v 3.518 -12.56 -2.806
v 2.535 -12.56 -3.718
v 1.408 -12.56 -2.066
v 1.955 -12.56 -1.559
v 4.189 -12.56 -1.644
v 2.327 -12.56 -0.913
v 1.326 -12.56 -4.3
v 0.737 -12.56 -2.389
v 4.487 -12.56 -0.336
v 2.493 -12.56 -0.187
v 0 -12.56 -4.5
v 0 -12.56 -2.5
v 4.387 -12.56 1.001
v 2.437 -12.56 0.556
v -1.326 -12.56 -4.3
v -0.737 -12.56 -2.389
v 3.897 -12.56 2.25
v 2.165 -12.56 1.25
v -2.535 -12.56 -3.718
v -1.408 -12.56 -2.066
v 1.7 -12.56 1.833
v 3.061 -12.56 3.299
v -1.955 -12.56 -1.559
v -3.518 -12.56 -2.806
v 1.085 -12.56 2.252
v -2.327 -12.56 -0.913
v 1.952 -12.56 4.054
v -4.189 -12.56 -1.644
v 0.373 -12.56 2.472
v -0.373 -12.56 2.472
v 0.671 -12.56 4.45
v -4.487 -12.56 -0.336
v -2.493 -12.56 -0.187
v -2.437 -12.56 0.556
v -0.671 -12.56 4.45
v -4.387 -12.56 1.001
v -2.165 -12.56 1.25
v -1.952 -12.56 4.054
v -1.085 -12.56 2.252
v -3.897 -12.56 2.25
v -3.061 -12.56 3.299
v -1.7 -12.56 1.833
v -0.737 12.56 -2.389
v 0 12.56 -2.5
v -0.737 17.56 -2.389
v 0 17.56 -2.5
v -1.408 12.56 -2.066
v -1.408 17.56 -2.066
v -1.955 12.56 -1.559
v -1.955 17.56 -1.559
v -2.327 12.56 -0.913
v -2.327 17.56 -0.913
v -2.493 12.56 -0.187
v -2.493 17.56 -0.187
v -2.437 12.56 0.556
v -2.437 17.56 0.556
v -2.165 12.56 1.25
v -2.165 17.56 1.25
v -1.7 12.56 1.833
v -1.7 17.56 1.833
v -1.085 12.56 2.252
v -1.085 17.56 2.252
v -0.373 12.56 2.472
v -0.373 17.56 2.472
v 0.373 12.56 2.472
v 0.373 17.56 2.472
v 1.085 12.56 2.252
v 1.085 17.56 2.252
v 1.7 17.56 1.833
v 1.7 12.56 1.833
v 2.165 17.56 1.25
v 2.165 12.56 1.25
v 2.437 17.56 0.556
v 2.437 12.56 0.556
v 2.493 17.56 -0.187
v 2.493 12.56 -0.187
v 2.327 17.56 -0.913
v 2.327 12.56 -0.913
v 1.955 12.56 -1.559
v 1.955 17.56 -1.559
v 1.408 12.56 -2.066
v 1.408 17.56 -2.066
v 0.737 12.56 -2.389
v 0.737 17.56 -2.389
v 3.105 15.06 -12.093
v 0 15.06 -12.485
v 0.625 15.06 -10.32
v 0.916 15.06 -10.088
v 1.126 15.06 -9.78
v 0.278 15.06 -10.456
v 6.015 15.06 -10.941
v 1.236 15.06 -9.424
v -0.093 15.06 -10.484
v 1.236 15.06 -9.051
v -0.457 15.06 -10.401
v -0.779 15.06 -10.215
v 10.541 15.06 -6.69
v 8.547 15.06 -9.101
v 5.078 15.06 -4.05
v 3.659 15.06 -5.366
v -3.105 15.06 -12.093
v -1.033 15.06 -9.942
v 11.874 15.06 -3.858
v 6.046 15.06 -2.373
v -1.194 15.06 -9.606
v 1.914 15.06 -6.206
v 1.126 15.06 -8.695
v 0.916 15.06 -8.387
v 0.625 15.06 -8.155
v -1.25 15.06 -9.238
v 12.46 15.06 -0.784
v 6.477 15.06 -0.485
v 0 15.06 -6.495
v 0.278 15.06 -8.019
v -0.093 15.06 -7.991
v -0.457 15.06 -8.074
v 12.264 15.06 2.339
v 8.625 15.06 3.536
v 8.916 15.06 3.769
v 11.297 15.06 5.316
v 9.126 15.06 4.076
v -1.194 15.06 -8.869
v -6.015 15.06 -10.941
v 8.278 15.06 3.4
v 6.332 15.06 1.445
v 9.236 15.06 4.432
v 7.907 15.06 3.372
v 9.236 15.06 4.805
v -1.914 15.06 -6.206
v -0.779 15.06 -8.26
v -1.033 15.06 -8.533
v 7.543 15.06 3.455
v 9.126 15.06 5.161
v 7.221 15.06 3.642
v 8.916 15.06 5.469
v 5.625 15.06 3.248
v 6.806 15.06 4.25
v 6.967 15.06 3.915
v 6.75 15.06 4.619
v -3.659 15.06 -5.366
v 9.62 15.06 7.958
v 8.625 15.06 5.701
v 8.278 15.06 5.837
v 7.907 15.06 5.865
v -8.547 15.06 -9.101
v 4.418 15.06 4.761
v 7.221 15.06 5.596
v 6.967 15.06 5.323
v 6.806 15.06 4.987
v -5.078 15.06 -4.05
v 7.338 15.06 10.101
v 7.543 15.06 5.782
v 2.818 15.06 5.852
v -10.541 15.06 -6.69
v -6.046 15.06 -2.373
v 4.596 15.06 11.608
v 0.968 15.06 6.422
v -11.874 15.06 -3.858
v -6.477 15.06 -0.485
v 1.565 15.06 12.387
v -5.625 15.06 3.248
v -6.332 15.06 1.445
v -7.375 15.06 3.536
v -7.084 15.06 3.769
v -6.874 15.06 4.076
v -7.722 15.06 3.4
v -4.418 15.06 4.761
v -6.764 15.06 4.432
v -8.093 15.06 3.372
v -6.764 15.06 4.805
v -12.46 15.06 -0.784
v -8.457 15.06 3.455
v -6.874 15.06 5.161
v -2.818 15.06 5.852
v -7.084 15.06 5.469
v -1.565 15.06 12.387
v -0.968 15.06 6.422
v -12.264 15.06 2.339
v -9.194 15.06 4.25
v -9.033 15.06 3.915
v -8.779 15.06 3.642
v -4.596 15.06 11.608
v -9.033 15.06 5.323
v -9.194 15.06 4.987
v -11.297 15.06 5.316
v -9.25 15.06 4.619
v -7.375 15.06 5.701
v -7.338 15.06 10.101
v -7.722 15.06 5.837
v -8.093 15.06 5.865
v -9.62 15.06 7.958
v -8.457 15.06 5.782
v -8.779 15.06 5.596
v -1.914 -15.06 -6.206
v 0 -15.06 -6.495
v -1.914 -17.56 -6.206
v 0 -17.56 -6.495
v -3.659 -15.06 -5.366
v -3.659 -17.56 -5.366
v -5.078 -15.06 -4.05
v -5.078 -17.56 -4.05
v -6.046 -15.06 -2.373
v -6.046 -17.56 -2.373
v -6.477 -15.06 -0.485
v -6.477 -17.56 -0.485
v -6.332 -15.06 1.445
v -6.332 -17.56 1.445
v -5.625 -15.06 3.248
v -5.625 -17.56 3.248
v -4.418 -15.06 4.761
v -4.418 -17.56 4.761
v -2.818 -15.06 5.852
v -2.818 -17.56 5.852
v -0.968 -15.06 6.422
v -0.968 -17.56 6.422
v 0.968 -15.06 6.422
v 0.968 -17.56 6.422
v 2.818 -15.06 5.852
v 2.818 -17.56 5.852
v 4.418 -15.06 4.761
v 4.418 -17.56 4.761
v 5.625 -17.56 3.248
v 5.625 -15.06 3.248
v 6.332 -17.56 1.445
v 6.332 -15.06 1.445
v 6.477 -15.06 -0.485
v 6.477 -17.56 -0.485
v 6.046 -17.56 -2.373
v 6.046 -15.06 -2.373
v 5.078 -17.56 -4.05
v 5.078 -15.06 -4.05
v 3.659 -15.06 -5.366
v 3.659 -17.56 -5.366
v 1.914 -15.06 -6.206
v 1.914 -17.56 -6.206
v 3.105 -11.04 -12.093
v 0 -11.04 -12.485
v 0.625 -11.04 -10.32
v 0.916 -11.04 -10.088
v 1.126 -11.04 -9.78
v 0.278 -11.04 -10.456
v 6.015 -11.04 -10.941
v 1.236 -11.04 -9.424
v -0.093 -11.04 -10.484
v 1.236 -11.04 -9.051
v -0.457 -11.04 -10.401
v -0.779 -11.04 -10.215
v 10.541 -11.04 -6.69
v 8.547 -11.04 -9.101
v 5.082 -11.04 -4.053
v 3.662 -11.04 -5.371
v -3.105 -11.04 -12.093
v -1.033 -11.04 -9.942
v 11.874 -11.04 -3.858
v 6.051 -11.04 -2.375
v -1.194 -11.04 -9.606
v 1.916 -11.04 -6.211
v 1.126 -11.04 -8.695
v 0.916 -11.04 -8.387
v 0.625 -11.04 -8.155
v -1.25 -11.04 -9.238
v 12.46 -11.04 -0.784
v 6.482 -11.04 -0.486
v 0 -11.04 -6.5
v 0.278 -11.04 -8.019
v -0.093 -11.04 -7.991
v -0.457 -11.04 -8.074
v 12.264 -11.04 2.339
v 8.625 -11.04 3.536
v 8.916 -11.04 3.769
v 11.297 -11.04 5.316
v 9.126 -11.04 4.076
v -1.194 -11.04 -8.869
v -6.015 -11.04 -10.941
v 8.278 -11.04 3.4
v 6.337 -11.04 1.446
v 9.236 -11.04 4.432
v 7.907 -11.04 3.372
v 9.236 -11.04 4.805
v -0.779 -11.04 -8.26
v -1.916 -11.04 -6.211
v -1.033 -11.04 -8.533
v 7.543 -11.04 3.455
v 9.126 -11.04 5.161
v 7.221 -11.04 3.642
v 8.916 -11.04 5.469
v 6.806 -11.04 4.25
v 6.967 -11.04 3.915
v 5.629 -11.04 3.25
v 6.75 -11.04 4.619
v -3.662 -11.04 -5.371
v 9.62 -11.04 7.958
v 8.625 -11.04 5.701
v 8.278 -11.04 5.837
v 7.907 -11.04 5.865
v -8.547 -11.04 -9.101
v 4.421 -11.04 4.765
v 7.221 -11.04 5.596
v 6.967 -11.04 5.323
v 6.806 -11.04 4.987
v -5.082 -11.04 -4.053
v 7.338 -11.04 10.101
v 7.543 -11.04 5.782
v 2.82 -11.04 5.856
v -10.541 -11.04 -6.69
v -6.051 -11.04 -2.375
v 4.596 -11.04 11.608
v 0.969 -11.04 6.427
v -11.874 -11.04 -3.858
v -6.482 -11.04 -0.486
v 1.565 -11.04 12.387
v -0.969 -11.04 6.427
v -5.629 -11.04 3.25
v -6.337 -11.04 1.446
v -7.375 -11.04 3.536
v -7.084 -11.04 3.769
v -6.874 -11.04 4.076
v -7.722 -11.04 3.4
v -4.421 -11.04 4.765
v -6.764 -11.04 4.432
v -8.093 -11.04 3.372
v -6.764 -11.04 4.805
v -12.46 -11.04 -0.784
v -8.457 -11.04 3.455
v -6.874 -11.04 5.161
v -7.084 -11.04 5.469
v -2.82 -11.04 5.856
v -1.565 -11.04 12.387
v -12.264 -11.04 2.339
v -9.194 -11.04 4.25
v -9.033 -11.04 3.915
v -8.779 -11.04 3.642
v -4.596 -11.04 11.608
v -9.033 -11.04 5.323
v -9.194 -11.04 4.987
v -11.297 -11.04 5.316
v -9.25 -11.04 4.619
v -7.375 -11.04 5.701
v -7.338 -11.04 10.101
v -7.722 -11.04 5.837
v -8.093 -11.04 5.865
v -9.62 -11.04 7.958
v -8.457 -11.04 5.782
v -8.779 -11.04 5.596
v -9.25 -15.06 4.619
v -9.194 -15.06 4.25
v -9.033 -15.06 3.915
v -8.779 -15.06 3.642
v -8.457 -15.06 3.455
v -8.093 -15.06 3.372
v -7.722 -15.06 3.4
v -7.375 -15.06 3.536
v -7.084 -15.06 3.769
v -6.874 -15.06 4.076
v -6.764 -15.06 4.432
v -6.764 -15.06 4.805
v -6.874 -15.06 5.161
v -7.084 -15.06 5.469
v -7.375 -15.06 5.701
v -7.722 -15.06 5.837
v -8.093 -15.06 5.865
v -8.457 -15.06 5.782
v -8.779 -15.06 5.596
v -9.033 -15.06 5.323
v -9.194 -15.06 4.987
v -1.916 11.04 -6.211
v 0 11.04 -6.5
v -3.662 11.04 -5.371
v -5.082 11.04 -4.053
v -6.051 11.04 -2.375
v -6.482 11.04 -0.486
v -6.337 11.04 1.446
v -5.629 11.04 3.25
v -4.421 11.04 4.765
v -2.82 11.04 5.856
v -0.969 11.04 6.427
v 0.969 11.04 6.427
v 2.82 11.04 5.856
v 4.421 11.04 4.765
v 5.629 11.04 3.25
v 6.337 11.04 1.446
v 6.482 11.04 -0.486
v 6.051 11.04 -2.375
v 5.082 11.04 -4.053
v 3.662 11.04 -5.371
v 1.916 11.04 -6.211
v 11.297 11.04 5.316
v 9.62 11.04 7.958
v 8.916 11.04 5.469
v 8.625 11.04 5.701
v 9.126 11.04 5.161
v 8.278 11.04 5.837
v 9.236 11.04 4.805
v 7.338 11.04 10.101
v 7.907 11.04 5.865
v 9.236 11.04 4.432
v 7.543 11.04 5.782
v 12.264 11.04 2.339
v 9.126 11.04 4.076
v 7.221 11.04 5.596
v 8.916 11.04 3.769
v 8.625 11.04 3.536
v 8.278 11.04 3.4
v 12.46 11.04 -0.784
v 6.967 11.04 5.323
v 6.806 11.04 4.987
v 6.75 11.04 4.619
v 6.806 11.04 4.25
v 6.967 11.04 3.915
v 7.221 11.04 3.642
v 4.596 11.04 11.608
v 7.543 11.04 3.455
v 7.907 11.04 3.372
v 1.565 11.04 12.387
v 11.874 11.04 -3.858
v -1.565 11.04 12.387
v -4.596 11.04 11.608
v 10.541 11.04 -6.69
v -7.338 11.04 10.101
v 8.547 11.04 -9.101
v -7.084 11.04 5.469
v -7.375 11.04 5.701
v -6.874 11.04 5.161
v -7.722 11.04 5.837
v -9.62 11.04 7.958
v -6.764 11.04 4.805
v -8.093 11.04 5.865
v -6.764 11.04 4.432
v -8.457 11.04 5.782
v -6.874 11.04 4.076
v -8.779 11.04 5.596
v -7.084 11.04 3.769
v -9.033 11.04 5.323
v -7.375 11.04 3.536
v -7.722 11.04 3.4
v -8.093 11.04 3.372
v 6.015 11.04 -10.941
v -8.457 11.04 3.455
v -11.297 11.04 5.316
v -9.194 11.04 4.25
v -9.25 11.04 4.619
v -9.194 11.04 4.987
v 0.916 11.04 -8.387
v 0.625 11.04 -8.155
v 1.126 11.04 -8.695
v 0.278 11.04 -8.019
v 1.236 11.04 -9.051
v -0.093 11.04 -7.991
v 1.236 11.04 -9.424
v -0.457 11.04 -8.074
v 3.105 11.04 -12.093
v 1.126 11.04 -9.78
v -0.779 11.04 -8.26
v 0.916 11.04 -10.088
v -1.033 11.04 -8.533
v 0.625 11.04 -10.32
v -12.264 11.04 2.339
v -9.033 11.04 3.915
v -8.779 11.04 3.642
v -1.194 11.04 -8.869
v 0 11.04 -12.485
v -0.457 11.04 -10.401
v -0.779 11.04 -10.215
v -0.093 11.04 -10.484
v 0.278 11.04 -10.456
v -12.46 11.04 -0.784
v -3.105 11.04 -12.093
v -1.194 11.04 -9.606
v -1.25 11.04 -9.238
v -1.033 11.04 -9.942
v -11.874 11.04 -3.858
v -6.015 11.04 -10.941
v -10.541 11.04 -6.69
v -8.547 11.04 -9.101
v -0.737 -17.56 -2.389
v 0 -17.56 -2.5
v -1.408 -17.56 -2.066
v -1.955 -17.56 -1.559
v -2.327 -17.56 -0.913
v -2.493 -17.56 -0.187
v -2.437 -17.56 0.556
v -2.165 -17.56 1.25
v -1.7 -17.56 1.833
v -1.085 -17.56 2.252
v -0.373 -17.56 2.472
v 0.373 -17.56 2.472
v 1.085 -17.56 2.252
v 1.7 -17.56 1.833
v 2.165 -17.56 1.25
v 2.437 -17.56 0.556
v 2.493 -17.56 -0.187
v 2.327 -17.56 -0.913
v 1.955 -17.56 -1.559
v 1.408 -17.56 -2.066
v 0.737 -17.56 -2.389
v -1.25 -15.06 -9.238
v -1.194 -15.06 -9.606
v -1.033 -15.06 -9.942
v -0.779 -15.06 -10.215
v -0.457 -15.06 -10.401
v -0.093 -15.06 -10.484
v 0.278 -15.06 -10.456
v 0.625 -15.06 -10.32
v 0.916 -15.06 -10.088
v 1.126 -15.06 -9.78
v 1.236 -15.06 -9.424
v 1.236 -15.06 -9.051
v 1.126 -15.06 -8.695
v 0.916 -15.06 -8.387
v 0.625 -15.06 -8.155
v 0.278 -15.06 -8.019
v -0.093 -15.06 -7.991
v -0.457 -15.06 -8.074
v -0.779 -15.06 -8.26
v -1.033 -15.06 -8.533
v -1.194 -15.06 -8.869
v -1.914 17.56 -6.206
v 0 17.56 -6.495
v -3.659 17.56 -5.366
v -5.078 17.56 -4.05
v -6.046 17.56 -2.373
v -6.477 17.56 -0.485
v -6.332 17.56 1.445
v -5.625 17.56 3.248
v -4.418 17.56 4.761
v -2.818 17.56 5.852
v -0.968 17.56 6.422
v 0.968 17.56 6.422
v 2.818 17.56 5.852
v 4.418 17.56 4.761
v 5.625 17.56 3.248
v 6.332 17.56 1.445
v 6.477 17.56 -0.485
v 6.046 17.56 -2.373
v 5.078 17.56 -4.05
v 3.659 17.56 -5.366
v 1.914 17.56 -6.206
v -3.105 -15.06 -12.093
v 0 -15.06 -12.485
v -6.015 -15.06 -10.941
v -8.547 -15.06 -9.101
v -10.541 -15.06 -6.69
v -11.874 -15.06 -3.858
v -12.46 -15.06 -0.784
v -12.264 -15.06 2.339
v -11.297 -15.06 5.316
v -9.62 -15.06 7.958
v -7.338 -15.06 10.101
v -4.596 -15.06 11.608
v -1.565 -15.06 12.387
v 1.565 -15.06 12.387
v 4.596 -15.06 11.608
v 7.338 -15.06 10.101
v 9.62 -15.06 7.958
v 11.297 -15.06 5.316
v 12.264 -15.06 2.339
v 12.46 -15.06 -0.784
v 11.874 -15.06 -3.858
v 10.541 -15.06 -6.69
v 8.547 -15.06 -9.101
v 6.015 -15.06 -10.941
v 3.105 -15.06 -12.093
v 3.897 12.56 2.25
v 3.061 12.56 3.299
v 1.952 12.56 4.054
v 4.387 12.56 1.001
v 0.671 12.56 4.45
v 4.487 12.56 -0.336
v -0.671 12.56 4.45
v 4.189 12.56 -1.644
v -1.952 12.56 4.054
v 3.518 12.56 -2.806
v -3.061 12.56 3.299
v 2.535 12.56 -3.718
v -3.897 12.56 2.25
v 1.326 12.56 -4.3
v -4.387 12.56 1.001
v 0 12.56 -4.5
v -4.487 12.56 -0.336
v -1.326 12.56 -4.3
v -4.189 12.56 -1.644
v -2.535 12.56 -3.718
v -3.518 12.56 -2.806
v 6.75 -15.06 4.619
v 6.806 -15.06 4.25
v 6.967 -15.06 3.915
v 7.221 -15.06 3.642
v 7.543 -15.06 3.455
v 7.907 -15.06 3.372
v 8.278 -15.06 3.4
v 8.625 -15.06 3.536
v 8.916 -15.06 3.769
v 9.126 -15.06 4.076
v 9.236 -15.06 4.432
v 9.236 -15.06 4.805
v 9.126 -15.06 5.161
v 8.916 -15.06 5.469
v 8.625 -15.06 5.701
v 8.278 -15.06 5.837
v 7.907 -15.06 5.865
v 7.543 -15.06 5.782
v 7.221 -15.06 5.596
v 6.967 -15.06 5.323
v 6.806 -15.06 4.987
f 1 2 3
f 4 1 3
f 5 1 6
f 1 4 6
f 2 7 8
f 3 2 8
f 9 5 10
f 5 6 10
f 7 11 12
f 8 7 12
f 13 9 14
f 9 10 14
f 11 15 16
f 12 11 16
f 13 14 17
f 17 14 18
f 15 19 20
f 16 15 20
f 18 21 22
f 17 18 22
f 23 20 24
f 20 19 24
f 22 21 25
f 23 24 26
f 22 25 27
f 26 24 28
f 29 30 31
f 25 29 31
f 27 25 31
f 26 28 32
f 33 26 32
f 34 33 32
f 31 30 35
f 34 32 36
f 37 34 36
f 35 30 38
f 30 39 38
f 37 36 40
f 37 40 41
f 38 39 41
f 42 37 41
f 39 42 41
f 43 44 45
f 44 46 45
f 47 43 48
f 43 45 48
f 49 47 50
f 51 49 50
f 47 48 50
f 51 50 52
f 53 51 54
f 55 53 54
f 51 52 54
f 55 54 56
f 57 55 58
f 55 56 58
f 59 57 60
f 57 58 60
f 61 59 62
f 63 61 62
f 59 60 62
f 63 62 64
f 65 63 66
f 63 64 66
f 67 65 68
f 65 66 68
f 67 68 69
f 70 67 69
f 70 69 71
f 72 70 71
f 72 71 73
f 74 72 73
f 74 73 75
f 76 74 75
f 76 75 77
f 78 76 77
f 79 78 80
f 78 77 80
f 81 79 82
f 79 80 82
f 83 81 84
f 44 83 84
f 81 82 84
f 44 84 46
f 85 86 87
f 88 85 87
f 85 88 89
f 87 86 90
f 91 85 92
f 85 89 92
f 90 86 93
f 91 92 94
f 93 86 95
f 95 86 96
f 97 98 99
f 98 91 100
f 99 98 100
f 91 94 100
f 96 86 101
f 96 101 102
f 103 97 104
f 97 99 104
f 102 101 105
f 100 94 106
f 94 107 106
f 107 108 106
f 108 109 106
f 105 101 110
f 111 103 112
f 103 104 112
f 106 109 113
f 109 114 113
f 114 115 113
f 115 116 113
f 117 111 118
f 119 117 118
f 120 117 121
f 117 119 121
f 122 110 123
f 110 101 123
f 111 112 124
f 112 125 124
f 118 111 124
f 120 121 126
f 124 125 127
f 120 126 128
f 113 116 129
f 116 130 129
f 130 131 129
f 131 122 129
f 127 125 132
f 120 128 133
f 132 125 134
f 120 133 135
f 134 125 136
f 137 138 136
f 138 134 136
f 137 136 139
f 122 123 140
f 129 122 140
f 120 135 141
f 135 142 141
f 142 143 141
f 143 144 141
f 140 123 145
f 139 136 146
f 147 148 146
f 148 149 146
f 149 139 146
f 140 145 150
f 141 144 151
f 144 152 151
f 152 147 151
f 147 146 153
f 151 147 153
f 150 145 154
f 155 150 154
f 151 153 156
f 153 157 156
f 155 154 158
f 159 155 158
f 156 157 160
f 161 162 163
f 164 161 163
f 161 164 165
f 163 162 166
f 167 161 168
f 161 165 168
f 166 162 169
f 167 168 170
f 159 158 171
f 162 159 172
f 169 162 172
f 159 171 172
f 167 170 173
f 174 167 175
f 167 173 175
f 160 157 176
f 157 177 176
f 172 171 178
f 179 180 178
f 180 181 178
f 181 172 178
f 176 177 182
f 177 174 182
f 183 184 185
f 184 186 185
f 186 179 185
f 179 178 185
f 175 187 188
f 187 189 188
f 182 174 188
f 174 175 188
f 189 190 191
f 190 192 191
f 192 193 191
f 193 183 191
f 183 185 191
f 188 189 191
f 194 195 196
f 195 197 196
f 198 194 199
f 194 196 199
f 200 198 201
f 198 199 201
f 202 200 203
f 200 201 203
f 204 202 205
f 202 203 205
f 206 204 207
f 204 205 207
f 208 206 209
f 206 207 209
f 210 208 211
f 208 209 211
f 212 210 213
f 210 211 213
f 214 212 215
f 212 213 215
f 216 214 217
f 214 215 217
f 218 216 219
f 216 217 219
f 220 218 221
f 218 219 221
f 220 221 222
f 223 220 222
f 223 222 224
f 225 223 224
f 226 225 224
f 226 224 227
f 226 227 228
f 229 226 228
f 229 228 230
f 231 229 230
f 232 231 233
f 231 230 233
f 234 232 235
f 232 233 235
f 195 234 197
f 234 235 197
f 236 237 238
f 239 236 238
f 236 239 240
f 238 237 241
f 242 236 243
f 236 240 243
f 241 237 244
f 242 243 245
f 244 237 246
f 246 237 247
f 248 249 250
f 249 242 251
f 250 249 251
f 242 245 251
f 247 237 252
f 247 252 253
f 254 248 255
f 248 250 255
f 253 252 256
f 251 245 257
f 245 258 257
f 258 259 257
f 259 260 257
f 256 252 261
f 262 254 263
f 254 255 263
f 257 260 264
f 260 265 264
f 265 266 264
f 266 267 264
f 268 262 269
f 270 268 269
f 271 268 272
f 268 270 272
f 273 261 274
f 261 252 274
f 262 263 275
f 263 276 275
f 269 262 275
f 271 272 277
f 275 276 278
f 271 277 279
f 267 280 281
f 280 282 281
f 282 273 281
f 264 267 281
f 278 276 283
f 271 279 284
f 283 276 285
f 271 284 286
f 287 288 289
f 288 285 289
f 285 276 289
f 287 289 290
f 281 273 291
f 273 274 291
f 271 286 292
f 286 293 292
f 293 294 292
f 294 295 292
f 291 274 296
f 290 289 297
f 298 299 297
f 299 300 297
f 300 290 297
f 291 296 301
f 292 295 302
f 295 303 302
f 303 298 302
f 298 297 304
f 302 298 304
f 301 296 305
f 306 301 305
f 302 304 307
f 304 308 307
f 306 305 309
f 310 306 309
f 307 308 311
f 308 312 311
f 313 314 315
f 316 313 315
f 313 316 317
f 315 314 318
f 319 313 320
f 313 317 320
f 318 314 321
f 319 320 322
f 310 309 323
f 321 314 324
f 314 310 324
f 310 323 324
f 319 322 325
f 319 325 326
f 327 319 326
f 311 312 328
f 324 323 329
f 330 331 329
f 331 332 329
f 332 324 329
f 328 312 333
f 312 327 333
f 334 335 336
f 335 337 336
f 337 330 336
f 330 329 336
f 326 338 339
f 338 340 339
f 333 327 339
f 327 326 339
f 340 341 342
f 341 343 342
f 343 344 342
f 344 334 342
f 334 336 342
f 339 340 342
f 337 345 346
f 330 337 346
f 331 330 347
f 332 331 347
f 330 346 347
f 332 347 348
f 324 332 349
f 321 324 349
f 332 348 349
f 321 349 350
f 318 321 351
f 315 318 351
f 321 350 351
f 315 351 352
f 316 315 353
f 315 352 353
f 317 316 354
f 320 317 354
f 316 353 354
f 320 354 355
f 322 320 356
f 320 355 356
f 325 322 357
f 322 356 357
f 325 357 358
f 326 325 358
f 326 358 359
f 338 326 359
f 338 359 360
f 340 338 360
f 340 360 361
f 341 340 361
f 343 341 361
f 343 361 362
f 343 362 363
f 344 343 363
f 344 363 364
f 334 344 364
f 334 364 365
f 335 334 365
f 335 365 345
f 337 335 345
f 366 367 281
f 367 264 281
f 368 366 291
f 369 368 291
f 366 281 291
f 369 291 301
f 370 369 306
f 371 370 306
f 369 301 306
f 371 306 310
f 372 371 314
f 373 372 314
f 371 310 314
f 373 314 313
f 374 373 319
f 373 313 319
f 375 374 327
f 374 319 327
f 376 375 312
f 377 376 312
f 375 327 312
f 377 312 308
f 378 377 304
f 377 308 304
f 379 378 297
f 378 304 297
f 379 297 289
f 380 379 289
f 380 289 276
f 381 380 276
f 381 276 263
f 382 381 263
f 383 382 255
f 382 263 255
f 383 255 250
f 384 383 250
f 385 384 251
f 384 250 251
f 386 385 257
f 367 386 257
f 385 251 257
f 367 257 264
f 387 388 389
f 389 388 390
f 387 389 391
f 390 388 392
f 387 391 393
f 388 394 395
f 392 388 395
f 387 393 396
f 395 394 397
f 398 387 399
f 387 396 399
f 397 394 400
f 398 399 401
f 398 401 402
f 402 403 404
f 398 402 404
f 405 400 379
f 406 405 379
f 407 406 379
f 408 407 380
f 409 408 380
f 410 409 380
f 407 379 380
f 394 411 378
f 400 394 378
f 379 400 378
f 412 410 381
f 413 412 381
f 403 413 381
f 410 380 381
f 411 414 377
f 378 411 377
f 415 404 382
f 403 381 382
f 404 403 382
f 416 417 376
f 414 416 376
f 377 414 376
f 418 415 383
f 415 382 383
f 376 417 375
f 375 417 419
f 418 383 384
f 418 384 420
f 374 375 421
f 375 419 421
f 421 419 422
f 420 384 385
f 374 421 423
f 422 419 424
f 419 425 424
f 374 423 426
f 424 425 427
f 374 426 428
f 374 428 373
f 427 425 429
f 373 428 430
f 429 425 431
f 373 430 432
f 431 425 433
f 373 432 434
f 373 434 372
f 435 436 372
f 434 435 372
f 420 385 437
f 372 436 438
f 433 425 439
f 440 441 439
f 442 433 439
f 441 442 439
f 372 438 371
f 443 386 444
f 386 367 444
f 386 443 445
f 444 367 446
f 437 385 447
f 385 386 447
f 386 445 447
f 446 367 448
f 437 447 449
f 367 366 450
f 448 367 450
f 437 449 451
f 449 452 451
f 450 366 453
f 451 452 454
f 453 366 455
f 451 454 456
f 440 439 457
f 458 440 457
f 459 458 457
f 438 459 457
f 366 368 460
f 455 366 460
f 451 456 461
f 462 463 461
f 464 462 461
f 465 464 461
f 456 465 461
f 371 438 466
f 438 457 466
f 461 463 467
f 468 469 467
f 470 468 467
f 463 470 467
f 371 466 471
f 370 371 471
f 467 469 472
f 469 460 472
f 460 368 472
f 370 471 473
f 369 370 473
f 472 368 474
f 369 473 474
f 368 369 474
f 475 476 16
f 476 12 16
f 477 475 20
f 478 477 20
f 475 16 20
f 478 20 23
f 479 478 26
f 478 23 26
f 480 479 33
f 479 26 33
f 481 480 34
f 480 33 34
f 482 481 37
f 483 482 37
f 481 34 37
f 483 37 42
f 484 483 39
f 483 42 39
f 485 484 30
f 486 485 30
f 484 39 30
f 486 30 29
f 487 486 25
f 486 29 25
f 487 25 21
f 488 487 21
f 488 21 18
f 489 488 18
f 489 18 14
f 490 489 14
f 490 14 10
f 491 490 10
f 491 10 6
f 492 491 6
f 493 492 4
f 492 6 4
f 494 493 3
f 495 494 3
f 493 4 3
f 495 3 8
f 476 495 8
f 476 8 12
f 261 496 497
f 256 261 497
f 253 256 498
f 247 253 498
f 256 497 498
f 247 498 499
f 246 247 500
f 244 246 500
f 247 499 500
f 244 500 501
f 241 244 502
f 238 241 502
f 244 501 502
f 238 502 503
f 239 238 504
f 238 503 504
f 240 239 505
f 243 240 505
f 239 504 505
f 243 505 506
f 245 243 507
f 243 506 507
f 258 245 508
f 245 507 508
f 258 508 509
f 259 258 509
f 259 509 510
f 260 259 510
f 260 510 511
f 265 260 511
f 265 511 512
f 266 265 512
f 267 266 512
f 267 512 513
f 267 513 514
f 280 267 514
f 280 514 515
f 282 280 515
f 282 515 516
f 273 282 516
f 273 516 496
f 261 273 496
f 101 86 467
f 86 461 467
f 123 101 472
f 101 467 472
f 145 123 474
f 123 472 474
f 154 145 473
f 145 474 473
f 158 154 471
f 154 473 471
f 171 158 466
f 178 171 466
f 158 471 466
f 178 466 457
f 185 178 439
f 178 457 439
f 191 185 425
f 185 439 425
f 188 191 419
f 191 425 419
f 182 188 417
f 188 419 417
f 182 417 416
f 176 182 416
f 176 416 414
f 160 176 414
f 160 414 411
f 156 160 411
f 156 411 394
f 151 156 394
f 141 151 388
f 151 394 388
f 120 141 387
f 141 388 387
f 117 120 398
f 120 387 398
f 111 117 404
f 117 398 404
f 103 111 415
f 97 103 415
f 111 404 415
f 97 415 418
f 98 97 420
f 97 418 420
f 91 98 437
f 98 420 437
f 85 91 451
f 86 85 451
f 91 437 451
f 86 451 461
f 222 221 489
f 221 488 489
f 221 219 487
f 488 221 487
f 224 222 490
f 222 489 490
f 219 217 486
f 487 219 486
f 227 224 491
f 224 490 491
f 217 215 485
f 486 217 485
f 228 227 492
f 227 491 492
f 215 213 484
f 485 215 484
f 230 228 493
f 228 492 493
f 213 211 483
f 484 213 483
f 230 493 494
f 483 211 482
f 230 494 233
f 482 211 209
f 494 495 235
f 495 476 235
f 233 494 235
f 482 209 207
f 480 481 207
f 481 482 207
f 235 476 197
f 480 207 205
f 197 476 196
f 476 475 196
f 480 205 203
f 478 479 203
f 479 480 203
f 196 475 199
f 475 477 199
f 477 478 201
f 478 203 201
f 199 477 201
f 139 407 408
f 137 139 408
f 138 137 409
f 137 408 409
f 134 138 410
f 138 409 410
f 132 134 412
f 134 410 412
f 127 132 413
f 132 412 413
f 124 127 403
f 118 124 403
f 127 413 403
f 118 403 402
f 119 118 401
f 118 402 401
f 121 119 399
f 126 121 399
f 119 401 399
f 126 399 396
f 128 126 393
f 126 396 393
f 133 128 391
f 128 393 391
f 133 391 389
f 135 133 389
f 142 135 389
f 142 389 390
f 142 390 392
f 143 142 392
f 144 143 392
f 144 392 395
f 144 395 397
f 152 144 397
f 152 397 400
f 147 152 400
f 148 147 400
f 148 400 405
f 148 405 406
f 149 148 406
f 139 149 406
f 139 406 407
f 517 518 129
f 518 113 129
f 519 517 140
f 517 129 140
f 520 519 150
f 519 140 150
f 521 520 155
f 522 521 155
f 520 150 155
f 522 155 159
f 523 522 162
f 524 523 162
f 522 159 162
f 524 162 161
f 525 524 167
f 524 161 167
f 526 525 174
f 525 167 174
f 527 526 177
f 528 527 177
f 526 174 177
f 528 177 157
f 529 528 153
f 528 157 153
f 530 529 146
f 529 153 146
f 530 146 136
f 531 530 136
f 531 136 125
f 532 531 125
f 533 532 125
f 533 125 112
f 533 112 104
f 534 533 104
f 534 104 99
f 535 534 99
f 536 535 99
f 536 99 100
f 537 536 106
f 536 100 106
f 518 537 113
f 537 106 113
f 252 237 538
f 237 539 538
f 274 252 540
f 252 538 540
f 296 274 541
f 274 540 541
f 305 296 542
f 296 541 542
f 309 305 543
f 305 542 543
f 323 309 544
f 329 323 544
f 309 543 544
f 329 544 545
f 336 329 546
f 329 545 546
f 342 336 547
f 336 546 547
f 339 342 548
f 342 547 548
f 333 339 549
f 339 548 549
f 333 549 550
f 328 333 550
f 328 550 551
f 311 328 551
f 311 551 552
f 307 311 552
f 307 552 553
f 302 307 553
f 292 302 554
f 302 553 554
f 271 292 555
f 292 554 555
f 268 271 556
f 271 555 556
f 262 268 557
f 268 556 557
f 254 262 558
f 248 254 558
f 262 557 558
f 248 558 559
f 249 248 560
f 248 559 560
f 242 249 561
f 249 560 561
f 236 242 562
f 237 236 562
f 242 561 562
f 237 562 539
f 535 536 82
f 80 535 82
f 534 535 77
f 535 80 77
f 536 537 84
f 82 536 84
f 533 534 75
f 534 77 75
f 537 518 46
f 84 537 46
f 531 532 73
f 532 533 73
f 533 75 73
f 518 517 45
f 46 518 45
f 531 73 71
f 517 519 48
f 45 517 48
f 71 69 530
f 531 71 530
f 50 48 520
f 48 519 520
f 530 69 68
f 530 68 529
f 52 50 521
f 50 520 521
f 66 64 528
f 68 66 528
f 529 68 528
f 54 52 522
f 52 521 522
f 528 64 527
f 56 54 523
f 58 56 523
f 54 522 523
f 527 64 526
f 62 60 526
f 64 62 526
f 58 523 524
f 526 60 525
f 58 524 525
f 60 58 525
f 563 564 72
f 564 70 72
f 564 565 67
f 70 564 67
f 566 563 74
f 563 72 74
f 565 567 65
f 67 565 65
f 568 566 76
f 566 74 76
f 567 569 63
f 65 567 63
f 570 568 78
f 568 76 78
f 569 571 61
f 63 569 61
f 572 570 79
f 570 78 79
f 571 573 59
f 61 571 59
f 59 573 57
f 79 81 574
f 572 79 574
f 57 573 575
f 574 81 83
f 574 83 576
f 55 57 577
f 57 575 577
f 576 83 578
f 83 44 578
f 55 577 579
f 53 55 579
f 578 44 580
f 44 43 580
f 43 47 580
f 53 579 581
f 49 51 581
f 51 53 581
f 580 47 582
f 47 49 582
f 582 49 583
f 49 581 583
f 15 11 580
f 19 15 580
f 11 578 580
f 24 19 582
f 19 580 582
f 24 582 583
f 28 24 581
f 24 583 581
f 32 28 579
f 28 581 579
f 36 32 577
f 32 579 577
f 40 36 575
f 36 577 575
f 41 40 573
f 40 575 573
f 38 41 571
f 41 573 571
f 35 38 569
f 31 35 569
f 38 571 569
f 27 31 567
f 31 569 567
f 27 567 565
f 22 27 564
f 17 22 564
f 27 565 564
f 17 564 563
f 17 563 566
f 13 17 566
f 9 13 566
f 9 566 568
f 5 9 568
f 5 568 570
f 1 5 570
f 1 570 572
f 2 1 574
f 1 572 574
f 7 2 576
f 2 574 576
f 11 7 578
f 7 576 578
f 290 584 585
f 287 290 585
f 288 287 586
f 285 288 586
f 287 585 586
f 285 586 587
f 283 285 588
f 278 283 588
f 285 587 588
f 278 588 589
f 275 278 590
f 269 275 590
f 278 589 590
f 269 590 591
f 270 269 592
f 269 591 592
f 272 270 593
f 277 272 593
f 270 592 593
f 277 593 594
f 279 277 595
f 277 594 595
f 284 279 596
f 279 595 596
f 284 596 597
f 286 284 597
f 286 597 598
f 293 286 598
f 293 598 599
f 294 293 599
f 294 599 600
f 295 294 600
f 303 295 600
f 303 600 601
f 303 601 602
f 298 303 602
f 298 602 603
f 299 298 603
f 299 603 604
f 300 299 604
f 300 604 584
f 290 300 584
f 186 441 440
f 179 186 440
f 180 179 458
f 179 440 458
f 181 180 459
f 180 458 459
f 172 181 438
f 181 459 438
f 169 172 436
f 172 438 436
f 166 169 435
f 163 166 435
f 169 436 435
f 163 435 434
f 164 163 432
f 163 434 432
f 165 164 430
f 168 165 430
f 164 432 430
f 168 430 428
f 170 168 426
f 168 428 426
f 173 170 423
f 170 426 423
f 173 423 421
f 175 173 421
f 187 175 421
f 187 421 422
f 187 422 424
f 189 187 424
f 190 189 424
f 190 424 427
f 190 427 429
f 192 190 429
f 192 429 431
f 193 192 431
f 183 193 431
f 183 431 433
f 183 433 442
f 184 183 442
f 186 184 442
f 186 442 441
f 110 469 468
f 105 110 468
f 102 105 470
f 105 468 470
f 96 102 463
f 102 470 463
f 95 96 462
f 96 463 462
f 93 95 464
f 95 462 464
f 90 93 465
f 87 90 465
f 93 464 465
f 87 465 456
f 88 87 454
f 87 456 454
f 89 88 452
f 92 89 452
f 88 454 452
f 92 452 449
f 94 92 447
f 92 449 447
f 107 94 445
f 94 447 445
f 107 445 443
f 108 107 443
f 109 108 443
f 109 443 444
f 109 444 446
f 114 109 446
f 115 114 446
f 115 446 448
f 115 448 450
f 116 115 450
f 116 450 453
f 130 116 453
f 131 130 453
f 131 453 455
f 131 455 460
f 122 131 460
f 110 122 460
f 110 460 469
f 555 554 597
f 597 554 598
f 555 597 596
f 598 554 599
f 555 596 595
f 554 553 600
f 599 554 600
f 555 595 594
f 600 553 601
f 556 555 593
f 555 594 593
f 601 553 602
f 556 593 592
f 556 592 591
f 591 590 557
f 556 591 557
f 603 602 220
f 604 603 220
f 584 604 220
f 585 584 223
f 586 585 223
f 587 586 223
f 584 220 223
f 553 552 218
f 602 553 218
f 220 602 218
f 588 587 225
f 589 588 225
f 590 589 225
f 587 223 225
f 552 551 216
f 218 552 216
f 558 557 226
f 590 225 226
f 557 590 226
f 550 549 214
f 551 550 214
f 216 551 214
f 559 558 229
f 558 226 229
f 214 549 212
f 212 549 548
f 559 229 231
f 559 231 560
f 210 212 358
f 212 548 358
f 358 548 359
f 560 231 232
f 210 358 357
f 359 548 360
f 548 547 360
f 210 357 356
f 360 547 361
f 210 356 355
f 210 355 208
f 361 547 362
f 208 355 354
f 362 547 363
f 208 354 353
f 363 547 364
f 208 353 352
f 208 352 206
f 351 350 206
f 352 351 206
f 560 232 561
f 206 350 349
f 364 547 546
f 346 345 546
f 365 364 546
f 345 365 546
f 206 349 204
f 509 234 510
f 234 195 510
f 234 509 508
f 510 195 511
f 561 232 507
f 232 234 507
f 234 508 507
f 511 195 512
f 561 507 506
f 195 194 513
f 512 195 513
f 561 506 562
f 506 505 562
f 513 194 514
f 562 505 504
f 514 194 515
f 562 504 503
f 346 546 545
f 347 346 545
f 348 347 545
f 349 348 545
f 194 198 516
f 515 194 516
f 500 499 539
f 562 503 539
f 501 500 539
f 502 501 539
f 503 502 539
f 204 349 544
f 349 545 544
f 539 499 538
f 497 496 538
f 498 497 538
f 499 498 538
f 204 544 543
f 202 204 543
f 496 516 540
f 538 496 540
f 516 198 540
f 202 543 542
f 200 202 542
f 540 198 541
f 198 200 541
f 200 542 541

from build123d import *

# Parameters (mm, degrees)
FORO_FILETTATO_M3X0_5_1_D = 2.5


with BuildPart() as part:
    # Schizzo1 → Rivoluzione1 (revolve)
    with BuildSketch(Plane.XY, mode=Mode.PRIVATE) as rivoluzione1_sk:
        Polygon((2.5, -12.56), (4.5, -12.56), (4.5, 12.56), (2.5, 12.56), (2.5, 17.56), (6.495, 17.56), (6.495, 15.06), (12.485, 15.06), (12.485, 11.04), (6.5, 11.04), (6.5, -11.04), (12.485, -11.04), (12.485, -15.06), (6.495, -15.06), (6.495, -17.56), (2.5, -17.56), align=None)
    revolve(rivoluzione1_sk.sketch.rotate(Axis((0, 0, 0), (0, 1, 0)), 90), axis=Axis((0, 0, 0), (0, 1, 0)))

    # Foro filettato M3x0.5-1 (through all)
    with Locations(Plane(origin=(0, 15.06, 0), x_dir=(1, 0, 0), z_dir=(0, 1, 0))):
        with Locations((0, 9.237604307), (8, -4.618802154), (-8, -4.618802154)):
            Hole(FORO_FILETTATO_M3X0_5_1_D / 2)


solid = part.part
